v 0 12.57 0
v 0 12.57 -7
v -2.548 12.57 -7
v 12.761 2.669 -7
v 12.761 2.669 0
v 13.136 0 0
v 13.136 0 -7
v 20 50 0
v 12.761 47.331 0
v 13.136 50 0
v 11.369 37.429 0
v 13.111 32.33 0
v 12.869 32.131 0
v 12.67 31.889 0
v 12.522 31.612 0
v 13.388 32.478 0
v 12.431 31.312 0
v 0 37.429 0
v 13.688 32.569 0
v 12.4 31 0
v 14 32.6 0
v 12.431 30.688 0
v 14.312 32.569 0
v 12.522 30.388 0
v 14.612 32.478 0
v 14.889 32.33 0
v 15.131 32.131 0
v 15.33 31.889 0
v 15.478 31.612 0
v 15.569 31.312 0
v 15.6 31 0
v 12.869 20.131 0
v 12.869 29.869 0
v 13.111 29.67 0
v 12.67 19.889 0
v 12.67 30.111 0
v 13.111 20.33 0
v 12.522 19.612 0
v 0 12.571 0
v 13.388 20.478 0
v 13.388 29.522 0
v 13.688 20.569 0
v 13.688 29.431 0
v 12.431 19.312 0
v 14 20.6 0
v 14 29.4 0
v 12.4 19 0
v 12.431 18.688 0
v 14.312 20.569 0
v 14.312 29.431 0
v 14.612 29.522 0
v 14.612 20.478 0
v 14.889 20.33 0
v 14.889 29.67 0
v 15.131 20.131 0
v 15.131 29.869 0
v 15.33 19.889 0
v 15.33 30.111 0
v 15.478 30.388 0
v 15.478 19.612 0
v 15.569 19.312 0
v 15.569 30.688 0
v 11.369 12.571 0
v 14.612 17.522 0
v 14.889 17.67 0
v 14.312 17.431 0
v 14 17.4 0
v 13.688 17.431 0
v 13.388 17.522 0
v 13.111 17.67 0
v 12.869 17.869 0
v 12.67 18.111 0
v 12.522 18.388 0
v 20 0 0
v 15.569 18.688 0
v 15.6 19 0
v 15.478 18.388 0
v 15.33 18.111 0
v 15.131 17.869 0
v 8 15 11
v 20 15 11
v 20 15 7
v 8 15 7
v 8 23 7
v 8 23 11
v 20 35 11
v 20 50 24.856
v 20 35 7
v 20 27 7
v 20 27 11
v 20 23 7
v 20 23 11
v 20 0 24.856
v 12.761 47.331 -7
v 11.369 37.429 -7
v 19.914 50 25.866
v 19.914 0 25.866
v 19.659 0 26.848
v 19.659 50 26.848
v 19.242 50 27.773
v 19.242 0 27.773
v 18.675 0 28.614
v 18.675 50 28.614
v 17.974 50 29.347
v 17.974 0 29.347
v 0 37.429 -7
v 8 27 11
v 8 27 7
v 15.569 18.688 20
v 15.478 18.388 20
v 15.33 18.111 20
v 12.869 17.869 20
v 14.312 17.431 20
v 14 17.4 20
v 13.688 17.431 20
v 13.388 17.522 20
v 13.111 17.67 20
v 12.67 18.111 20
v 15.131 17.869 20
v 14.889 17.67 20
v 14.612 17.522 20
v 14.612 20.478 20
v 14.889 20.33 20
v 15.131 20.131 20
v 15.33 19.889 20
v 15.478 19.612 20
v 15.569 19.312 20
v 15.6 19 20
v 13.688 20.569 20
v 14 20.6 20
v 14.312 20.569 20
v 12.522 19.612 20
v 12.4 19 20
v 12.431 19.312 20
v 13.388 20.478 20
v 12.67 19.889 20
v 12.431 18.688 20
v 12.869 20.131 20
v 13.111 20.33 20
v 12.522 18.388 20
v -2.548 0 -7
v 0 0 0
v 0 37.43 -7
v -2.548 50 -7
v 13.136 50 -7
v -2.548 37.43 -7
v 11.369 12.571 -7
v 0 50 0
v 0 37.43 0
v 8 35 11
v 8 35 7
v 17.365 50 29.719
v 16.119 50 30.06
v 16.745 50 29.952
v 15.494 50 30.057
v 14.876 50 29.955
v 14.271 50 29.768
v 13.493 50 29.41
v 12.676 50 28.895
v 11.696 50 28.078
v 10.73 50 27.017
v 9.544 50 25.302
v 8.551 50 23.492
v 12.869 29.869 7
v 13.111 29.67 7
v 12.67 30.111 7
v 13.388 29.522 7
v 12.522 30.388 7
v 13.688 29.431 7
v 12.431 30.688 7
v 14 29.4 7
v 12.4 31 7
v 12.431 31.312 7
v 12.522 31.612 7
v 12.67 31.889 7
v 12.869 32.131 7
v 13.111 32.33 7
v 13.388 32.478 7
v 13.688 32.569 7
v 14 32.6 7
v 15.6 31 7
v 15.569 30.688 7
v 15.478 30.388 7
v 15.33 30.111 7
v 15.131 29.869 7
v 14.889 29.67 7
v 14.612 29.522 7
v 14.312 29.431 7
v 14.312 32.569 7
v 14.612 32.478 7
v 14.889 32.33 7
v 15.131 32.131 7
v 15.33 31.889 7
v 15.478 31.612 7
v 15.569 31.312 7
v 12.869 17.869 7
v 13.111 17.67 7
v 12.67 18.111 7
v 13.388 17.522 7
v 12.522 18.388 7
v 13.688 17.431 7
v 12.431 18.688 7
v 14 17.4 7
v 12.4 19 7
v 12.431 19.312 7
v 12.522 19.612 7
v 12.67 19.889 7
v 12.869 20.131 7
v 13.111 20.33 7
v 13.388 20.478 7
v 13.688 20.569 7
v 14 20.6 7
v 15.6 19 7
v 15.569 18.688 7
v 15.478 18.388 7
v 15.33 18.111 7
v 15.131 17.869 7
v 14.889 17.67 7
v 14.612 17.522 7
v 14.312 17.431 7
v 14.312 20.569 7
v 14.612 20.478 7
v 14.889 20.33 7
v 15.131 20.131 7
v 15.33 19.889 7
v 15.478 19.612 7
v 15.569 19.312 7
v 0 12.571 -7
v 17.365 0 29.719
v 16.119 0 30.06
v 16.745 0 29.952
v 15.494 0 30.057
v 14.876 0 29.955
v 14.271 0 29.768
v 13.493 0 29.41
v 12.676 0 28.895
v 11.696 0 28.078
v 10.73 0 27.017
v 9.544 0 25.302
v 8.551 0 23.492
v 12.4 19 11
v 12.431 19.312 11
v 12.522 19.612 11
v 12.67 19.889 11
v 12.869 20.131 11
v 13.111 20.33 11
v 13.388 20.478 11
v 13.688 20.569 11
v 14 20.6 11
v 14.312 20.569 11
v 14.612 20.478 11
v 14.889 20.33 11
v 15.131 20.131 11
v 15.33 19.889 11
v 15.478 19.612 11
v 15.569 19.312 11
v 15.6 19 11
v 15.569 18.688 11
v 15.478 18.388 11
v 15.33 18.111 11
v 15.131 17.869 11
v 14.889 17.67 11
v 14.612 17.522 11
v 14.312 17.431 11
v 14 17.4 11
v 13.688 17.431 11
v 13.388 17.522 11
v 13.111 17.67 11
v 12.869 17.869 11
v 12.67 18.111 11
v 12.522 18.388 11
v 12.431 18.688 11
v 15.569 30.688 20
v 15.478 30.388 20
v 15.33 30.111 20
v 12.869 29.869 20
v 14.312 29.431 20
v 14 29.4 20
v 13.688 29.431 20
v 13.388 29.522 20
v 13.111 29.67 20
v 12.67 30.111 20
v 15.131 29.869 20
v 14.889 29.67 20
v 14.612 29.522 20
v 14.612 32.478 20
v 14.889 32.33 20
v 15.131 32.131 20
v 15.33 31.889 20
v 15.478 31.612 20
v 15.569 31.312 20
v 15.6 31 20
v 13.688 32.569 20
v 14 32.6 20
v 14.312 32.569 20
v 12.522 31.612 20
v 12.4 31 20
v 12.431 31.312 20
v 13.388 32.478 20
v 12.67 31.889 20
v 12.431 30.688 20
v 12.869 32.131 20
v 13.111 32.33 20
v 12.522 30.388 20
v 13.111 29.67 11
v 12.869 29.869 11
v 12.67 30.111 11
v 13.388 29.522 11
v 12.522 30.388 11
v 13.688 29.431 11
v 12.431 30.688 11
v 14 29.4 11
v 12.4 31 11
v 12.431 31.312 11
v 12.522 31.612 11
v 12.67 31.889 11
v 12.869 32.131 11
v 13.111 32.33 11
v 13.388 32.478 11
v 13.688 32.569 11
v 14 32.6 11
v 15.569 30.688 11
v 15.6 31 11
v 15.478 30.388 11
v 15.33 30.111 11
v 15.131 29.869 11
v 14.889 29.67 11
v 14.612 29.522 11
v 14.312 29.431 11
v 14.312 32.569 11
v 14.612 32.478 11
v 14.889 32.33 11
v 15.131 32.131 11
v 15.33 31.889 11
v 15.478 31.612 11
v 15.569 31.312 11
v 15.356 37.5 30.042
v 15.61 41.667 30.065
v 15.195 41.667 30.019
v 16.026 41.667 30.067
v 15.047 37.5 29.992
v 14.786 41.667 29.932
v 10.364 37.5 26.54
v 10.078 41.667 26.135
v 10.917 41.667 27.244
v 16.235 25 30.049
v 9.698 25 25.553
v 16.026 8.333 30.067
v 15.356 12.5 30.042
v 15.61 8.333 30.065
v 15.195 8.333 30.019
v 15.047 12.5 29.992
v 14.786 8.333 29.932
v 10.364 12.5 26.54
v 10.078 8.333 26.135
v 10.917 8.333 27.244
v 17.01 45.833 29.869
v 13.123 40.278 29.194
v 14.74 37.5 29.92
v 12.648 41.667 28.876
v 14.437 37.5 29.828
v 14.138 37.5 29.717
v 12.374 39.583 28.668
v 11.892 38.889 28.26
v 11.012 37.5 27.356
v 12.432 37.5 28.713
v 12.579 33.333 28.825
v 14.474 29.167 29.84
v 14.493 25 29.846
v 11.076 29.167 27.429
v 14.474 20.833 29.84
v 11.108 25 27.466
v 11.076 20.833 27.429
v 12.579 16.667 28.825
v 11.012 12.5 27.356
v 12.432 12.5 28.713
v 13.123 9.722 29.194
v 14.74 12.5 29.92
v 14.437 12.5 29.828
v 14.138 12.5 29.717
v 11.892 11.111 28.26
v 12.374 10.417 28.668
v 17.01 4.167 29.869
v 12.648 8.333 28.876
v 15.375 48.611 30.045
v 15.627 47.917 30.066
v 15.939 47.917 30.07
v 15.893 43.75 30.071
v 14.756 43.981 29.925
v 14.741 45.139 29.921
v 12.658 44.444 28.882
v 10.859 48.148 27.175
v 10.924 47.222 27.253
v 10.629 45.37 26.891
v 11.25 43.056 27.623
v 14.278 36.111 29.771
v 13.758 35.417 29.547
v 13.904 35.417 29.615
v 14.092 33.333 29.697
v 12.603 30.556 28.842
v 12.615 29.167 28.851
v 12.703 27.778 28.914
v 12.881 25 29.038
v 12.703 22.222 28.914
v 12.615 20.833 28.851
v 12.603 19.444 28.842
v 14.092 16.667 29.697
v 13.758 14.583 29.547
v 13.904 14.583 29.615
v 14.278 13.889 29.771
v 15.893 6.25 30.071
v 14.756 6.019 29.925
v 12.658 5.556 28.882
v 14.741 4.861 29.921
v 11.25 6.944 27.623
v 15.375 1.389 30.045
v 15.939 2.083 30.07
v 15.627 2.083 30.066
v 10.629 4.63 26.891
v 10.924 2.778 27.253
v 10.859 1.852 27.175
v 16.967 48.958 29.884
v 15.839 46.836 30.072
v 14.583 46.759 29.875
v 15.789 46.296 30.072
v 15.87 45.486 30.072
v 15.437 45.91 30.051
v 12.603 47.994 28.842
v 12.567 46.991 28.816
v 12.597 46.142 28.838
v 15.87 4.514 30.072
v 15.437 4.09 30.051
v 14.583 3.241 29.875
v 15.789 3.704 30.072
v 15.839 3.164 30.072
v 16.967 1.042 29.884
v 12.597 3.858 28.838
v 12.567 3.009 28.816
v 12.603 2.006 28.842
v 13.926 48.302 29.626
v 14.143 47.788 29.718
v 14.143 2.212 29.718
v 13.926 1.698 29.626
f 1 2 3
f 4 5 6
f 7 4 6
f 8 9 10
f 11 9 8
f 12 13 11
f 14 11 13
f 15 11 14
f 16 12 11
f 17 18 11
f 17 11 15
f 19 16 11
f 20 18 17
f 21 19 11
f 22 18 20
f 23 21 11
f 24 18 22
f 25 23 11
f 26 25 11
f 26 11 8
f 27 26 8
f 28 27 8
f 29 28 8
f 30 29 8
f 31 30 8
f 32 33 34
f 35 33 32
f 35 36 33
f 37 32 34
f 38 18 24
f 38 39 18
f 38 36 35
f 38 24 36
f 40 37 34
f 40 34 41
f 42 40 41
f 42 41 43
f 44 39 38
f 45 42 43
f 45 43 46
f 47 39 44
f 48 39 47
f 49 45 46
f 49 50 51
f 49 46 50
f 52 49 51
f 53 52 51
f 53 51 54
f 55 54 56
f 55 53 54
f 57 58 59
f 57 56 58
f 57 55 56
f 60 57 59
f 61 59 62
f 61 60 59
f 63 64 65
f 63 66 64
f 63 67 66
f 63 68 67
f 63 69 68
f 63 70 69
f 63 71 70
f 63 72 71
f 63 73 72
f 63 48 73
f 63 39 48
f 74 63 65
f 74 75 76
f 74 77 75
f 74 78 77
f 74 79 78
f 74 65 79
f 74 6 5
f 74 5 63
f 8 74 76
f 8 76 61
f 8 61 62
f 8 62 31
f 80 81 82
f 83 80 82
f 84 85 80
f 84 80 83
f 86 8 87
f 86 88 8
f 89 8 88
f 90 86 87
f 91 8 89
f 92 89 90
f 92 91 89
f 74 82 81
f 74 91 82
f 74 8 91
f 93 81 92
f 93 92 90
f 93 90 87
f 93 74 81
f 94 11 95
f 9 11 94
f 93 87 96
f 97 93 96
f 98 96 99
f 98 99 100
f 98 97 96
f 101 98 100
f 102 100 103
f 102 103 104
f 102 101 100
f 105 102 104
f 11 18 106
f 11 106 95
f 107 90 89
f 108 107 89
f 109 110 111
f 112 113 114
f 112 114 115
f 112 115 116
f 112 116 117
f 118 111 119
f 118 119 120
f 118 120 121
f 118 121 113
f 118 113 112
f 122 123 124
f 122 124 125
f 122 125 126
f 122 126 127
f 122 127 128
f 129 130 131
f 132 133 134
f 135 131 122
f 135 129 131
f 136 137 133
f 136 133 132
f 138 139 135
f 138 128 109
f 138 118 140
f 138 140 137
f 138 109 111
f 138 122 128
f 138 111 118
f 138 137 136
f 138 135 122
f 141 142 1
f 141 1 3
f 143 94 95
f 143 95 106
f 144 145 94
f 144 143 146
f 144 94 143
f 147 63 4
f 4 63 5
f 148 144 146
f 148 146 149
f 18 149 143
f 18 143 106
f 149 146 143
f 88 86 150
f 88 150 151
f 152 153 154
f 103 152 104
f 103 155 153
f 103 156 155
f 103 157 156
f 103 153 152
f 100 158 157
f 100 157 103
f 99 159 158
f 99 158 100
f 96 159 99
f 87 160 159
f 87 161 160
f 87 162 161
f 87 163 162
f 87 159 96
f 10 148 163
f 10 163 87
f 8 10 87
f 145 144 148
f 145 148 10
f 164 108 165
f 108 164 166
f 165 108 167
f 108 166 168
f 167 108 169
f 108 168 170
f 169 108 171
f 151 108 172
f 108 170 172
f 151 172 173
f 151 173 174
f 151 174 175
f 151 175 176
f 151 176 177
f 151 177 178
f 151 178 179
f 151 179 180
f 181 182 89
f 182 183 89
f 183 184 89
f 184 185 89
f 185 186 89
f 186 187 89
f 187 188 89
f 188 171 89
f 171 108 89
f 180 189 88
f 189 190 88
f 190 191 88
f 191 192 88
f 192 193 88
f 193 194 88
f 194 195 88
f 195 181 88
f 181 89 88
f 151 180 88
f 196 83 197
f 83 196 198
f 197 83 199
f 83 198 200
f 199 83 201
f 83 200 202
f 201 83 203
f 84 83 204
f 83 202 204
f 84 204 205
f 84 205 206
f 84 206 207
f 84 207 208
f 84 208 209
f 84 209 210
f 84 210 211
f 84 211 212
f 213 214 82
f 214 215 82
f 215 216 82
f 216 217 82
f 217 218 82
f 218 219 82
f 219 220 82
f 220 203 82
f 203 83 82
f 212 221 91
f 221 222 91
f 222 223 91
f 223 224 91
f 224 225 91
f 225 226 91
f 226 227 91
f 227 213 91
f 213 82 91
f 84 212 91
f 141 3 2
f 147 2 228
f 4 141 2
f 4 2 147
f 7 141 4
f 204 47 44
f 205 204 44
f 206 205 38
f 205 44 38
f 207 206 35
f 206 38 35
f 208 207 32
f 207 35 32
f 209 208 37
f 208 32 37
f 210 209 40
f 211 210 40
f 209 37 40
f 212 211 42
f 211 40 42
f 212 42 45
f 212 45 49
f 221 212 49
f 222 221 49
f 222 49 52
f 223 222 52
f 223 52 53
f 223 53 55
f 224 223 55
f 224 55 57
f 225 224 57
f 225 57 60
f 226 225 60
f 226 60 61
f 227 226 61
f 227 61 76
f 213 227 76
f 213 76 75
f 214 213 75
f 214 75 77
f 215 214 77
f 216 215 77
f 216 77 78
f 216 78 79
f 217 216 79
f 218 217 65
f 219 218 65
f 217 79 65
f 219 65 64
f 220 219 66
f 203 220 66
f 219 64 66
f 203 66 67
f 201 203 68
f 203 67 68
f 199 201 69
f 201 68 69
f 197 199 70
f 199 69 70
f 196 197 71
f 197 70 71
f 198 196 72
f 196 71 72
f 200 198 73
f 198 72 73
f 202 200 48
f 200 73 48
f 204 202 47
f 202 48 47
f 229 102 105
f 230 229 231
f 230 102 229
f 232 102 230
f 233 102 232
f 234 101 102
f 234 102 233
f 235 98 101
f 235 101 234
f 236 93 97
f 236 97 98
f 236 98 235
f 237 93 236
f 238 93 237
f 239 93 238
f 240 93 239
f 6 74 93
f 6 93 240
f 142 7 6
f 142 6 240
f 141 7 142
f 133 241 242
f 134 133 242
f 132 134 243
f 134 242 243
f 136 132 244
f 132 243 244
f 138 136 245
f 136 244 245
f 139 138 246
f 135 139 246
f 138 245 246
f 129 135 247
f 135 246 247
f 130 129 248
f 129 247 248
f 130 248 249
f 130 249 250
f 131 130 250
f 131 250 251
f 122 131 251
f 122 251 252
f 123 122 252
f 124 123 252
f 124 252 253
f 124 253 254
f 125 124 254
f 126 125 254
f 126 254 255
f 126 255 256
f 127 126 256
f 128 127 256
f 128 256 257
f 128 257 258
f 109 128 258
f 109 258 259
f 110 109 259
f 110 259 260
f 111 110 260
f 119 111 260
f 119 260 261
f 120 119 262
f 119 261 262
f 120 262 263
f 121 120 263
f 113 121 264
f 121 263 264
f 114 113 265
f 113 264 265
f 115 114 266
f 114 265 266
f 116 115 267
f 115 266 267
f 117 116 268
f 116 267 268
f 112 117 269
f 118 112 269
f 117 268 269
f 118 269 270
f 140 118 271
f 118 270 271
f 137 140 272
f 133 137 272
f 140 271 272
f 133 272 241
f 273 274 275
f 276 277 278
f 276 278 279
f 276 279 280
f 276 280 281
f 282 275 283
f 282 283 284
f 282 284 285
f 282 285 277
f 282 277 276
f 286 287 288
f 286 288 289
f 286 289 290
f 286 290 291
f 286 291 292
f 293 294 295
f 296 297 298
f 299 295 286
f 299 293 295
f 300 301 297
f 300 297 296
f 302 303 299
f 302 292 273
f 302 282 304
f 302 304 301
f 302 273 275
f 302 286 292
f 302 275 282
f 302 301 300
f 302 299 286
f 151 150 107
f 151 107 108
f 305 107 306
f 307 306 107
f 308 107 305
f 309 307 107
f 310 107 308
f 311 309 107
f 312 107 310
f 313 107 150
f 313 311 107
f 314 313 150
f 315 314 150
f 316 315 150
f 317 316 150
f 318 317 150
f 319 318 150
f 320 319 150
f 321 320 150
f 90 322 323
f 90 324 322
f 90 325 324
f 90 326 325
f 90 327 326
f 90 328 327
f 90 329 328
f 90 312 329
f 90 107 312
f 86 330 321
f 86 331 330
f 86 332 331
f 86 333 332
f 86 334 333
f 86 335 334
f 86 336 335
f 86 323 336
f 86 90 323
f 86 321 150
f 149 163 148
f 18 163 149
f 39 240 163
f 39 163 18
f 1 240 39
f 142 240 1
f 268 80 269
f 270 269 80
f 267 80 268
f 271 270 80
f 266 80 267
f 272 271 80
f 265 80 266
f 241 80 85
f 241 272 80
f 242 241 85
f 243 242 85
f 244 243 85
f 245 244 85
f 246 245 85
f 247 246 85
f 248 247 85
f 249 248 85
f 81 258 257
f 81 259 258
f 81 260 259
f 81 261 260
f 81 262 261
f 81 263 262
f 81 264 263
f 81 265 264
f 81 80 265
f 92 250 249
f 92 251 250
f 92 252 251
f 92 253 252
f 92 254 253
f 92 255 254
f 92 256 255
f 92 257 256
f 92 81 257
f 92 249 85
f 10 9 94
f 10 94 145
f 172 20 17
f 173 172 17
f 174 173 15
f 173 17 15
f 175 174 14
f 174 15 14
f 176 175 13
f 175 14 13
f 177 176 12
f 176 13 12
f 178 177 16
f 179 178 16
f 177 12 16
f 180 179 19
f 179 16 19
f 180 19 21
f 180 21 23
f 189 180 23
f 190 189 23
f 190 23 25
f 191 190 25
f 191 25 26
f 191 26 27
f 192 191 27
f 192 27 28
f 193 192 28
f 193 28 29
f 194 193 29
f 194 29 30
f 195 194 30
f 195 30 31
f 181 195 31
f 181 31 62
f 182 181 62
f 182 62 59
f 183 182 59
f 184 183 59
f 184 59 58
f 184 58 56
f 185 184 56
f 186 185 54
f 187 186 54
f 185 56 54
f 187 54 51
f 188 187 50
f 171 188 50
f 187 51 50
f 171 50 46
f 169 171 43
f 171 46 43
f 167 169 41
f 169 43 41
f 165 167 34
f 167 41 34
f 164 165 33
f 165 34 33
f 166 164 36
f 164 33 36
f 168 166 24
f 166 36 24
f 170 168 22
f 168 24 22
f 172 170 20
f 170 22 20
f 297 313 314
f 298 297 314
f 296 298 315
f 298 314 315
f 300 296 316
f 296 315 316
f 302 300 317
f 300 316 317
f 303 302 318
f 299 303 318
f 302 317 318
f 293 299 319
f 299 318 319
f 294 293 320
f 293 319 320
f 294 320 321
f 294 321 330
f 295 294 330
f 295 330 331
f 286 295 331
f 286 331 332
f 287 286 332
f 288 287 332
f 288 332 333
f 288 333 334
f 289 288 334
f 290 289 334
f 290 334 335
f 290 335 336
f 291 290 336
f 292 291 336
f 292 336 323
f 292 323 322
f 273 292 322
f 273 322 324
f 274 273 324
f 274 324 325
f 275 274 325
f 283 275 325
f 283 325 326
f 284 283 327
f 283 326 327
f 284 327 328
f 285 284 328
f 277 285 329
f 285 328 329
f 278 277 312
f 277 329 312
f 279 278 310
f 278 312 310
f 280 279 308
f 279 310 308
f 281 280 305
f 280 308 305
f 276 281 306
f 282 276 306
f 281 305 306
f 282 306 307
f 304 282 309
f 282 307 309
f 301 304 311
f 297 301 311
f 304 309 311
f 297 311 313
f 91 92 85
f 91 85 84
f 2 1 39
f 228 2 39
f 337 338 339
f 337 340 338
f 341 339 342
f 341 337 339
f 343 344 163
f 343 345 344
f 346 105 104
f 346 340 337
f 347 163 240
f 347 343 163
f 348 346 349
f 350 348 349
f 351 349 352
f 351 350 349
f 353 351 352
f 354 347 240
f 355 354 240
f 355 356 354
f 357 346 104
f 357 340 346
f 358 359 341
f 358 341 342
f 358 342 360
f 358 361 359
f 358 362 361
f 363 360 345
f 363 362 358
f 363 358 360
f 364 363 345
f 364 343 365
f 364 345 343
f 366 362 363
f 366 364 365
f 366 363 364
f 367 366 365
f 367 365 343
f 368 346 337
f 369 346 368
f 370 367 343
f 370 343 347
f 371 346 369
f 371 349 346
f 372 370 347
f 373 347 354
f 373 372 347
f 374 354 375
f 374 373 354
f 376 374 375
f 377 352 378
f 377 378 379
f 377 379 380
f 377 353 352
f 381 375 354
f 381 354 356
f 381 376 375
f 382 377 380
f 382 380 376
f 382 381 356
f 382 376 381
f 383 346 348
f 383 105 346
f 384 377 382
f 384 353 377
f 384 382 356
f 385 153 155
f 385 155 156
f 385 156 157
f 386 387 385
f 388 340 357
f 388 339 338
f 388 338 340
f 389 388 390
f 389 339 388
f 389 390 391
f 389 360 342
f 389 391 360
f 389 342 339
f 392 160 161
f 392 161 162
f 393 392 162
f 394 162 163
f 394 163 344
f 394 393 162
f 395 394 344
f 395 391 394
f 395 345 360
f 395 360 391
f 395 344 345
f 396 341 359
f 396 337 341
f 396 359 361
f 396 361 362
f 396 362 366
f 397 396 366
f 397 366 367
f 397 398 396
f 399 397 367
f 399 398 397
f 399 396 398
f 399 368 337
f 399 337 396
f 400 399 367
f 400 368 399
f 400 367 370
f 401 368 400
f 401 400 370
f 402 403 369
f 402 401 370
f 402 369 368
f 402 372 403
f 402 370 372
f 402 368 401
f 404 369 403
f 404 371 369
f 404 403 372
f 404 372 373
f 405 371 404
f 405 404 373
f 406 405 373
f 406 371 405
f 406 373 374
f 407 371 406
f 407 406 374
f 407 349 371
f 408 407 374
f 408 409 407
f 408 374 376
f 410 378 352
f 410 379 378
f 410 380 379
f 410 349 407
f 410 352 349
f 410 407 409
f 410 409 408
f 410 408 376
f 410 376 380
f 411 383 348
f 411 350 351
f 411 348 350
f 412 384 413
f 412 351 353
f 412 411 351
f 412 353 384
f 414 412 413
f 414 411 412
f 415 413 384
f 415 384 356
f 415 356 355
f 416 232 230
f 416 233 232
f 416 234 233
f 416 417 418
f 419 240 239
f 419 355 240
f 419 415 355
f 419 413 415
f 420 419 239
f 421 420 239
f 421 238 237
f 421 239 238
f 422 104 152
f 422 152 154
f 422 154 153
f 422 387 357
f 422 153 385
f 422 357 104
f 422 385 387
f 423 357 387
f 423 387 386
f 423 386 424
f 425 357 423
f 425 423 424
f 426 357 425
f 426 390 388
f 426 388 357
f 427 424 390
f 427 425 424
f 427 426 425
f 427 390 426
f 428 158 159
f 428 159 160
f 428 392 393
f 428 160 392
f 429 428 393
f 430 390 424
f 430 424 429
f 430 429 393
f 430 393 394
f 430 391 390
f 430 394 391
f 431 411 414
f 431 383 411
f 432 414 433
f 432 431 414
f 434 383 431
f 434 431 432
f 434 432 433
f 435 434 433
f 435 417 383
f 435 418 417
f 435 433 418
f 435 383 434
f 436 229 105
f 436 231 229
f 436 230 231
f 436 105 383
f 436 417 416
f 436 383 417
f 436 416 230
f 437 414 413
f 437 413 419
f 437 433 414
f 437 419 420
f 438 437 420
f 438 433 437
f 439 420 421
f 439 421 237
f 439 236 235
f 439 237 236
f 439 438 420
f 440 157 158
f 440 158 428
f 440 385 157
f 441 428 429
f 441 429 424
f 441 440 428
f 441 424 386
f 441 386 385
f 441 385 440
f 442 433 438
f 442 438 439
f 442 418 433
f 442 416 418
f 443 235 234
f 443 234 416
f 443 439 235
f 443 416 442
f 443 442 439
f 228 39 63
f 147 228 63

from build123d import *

# Parameters (mm, degrees)
BOSS_EXTRUDE1_DEPTH  = 50
SKETCH2_R            = 1.6
CUT_EXTRUDE1_DEPTH   = 20
SKETCH4_W            = 4
SKETCH4_H            = 8
CUT_EXTRUDE2_DEPTH   = 12
BOSS_EXTRUDE4_DEPTH  = 7
BOSS_EXTRUDE12_DEPTH = 12.57
BOSS_EXTRUDE13_DEPTH = 12.57


with BuildPart() as part:
    # Sketch1 → Boss-Extrude1 (new body)
    with BuildSketch(Plane(origin=(0, 0, 0), x_dir=(1, 0, 0), z_dir=(0, 1, 0))):
        with BuildLine():
            Line((0, 0), (20, 0))
            Line((20, 0), (20, -24.855700299))
            ThreePointArc((20, -24.855700299), (19.469946725, -27.31925094), (17.973595405, -29.34680389))
            add(Edge.make_bspline(
                [(17.973595405, -29.34680389), (16.281120611, -30.60167495), (11.87635292, -29.319904822), (9.598231396, -25.56159513), (8.550503583, -23.49231552)],
                knots=[0, 0, 0, 0, 0.430742711, 1, 1, 1, 1], degree=3))
            Line((8.550503583, -23.49231552), (0, 0))
        make_face()
    extrude(amount=BOSS_EXTRUDE1_DEPTH)

    # Sketch2 → Cut-Extrude1 (cut)
    with BuildSketch(Plane(origin=(0, 0, 0), x_dir=(-1, 0, 0), z_dir=(0, 0, -1))):
        with Locations((-14, 31)):
            Circle(SKETCH2_R)
        with Locations((-14, 19)):
            Circle(SKETCH2_R)
    extrude(amount=-CUT_EXTRUDE1_DEPTH, mode=Mode.SUBTRACT)

    # Sketch4 → Cut-Extrude2 (cut)
    with BuildSketch(Plane(origin=(20, 0, 0), x_dir=(0, 0, -1), z_dir=(1, 0, 0))):
        with Locations((-9, 19)):
            Rectangle(SKETCH4_W, SKETCH4_H)
        with Locations((-9, 31)):
            Rectangle(SKETCH4_W, SKETCH4_H)
    extrude(amount=-CUT_EXTRUDE2_DEPTH, mode=Mode.SUBTRACT)

    # Sketch5 → Boss-Extrude4 (add)
    with BuildSketch(Plane(origin=(0, 0, 0), x_dir=(-1, 0, 0), z_dir=(0, 0, -1))):
        Polygon((-11.369100365, 37.428714266), (-12.760831375, 47.331394953), (-13.135879356, 50), (0, 50), (0, 37.428714266), align=None)
        Polygon((0, 12.571285734), (-11.369100365, 12.571285734), (-12.760831375, 2.668605047), (-13.135879356, 0), (0, 0), align=None)
    extrude(amount=BOSS_EXTRUDE4_DEPTH)

    # Sketch7 → Boss-Extrude12 (add)
    with BuildSketch(Plane(origin=(0, 50, 0), x_dir=(1, 0, 0), z_dir=(0, 1, 0))):
        Polygon((0, 0), (0, 7), (-2.54779164, 7), align=None)
    extrude(amount=-BOSS_EXTRUDE12_DEPTH)

    # Sketch8 → Boss-Extrude13 (add)
    with BuildSketch(Plane(origin=(0, 0, 0), x_dir=(-1, 0, 0), z_dir=(0, -1, 0))):
        Polygon((0, 0), (2.54779164, 7), (0, 7), align=None)
    extrude(amount=-BOSS_EXTRUDE13_DEPTH)


solid = part.part
